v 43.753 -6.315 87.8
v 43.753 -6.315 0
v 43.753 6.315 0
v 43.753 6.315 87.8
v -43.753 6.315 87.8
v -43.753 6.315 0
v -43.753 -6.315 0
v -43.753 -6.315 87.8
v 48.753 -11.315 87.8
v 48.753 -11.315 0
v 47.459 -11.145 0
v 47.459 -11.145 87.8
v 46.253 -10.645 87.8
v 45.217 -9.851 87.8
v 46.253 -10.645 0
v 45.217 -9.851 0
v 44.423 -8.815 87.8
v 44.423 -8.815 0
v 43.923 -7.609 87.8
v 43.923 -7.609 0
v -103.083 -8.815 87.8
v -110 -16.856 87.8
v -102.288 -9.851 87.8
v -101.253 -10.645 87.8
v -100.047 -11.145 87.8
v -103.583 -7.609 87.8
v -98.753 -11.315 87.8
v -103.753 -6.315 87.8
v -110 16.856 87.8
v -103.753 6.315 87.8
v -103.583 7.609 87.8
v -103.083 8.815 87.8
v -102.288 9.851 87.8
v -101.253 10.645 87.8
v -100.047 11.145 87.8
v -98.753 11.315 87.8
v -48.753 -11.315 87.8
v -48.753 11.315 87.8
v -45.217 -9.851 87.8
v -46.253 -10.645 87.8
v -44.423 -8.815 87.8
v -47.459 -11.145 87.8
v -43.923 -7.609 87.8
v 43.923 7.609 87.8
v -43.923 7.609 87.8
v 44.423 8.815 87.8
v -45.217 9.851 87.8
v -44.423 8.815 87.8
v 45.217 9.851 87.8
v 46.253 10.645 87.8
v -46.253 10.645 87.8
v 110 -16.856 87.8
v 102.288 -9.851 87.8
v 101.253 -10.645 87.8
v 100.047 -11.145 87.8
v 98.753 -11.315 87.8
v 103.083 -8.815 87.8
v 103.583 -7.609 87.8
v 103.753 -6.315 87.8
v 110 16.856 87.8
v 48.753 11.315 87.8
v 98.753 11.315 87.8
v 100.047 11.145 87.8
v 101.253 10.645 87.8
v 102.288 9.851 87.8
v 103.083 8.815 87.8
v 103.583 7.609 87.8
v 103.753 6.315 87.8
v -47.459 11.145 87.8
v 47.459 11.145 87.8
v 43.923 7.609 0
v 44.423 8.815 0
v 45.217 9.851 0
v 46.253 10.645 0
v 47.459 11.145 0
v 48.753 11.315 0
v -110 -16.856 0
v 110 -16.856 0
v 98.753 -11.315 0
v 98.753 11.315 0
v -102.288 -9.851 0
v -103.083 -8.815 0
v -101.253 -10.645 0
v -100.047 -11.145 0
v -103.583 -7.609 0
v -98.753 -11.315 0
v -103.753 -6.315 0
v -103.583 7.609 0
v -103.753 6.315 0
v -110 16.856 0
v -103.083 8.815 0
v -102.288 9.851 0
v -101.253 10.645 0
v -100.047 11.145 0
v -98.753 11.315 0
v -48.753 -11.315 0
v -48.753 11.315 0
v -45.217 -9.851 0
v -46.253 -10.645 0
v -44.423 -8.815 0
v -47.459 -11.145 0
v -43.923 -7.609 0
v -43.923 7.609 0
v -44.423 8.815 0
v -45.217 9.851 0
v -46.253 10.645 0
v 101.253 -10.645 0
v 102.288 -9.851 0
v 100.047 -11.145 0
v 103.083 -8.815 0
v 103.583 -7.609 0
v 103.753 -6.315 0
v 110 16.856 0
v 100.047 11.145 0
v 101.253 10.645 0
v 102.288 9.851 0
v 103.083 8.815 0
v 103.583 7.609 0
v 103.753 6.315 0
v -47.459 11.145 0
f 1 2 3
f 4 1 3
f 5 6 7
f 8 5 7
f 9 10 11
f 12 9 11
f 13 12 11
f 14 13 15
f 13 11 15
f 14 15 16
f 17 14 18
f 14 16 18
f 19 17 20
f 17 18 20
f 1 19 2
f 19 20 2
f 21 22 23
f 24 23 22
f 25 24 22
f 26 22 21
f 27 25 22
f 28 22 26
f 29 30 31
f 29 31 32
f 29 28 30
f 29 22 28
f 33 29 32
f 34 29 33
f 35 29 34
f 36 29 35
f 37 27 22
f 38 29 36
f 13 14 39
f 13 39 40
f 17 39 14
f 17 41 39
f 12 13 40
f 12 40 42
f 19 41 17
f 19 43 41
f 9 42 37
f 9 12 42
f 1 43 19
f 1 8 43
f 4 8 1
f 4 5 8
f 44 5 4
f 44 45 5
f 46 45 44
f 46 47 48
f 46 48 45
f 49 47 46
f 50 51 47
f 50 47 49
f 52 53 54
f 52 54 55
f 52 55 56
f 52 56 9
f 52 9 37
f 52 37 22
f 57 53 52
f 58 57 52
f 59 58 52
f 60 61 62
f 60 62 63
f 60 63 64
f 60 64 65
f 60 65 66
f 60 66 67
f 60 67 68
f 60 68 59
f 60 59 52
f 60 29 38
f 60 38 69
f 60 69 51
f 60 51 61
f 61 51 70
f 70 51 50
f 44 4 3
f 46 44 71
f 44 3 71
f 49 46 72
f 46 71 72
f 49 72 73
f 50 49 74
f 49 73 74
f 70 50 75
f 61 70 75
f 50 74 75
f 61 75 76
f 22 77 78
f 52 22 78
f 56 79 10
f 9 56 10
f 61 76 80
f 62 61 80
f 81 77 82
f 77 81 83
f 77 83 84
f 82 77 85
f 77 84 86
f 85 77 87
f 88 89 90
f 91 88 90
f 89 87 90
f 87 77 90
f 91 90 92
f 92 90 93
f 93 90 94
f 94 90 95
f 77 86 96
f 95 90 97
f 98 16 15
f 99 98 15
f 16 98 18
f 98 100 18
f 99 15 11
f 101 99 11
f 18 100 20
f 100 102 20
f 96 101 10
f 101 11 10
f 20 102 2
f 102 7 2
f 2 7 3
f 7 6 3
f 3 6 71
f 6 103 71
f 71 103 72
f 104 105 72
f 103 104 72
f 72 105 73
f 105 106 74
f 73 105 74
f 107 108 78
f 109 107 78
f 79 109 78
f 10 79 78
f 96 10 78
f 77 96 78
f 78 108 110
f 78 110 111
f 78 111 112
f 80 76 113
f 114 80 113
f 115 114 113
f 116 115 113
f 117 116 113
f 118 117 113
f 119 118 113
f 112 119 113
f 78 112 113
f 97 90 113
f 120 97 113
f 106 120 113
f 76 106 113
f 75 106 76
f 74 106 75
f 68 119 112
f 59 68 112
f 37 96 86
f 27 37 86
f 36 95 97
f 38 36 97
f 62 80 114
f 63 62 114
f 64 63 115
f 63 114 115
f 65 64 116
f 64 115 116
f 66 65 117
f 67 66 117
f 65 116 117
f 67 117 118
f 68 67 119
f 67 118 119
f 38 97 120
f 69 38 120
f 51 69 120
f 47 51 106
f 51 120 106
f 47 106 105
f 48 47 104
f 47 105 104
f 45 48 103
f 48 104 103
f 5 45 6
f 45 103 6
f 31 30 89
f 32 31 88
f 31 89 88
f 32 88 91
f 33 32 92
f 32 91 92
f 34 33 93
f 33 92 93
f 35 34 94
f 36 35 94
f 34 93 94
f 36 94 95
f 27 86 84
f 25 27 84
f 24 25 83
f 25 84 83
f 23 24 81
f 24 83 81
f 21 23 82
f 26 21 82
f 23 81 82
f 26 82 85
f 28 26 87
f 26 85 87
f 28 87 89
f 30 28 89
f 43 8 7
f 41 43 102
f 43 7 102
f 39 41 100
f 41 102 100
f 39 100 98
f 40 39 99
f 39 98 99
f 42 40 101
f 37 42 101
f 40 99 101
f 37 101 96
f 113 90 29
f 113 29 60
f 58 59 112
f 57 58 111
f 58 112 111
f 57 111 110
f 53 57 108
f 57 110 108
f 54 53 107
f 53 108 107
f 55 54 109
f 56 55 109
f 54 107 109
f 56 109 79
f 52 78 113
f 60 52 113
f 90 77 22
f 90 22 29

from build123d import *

# Parameters (mm, degrees)
F0_W     = 220
F0_H     = 33.712024
F1_DEPTH = 87.8


with BuildPart() as f1:
    # F0 (on Top) → F1 (new body)
    with BuildSketch(Plane.XY):
        Rectangle(F0_W, F0_H)
        with BuildLine():
            Line((-98.752904, 11.31518), (-48.752904, 11.31518))
            ThreePointArc((-48.752904, 11.31518), (-45.21737, 9.850714), (-43.752904, 6.31518))
            Line((-43.752904, 6.31518), (-43.752904, -6.31518))
            ThreePointArc((-43.752904, -6.31518), (-45.21737, -9.850714), (-48.752904, -11.31518))
            Line((-48.752904, -11.31518), (-98.752904, -11.31518))
            ThreePointArc((-98.752904, -11.31518), (-102.288438, -9.850714), (-103.752904, -6.31518))
            Line((-103.752904, -6.31518), (-103.752904, 6.31518))
            ThreePointArc((-103.752904, 6.31518), (-102.288438, 9.850714), (-98.752904, 11.31518))
        make_face(mode=Mode.SUBTRACT)
        with BuildLine():
            ThreePointArc((98.752904, 11.31518), (102.288438, 9.850714), (103.752904, 6.31518))
            Line((103.752904, 6.31518), (103.752904, -6.31518))
            ThreePointArc((103.752904, -6.31518), (102.288438, -9.850714), (98.752904, -11.31518))
            Line((98.752904, -11.31518), (48.752904, -11.31518))
            ThreePointArc((48.752904, -11.31518), (45.21737, -9.850714), (43.752904, -6.31518))
            Line((43.752904, -6.31518), (43.752904, 6.31518))
            ThreePointArc((43.752904, 6.31518), (45.21737, 9.850714), (48.752904, 11.31518))
            Line((48.752904, 11.31518), (98.752904, 11.31518))
        make_face(mode=Mode.SUBTRACT)
    extrude(amount=F1_DEPTH)


solid = f1.part
